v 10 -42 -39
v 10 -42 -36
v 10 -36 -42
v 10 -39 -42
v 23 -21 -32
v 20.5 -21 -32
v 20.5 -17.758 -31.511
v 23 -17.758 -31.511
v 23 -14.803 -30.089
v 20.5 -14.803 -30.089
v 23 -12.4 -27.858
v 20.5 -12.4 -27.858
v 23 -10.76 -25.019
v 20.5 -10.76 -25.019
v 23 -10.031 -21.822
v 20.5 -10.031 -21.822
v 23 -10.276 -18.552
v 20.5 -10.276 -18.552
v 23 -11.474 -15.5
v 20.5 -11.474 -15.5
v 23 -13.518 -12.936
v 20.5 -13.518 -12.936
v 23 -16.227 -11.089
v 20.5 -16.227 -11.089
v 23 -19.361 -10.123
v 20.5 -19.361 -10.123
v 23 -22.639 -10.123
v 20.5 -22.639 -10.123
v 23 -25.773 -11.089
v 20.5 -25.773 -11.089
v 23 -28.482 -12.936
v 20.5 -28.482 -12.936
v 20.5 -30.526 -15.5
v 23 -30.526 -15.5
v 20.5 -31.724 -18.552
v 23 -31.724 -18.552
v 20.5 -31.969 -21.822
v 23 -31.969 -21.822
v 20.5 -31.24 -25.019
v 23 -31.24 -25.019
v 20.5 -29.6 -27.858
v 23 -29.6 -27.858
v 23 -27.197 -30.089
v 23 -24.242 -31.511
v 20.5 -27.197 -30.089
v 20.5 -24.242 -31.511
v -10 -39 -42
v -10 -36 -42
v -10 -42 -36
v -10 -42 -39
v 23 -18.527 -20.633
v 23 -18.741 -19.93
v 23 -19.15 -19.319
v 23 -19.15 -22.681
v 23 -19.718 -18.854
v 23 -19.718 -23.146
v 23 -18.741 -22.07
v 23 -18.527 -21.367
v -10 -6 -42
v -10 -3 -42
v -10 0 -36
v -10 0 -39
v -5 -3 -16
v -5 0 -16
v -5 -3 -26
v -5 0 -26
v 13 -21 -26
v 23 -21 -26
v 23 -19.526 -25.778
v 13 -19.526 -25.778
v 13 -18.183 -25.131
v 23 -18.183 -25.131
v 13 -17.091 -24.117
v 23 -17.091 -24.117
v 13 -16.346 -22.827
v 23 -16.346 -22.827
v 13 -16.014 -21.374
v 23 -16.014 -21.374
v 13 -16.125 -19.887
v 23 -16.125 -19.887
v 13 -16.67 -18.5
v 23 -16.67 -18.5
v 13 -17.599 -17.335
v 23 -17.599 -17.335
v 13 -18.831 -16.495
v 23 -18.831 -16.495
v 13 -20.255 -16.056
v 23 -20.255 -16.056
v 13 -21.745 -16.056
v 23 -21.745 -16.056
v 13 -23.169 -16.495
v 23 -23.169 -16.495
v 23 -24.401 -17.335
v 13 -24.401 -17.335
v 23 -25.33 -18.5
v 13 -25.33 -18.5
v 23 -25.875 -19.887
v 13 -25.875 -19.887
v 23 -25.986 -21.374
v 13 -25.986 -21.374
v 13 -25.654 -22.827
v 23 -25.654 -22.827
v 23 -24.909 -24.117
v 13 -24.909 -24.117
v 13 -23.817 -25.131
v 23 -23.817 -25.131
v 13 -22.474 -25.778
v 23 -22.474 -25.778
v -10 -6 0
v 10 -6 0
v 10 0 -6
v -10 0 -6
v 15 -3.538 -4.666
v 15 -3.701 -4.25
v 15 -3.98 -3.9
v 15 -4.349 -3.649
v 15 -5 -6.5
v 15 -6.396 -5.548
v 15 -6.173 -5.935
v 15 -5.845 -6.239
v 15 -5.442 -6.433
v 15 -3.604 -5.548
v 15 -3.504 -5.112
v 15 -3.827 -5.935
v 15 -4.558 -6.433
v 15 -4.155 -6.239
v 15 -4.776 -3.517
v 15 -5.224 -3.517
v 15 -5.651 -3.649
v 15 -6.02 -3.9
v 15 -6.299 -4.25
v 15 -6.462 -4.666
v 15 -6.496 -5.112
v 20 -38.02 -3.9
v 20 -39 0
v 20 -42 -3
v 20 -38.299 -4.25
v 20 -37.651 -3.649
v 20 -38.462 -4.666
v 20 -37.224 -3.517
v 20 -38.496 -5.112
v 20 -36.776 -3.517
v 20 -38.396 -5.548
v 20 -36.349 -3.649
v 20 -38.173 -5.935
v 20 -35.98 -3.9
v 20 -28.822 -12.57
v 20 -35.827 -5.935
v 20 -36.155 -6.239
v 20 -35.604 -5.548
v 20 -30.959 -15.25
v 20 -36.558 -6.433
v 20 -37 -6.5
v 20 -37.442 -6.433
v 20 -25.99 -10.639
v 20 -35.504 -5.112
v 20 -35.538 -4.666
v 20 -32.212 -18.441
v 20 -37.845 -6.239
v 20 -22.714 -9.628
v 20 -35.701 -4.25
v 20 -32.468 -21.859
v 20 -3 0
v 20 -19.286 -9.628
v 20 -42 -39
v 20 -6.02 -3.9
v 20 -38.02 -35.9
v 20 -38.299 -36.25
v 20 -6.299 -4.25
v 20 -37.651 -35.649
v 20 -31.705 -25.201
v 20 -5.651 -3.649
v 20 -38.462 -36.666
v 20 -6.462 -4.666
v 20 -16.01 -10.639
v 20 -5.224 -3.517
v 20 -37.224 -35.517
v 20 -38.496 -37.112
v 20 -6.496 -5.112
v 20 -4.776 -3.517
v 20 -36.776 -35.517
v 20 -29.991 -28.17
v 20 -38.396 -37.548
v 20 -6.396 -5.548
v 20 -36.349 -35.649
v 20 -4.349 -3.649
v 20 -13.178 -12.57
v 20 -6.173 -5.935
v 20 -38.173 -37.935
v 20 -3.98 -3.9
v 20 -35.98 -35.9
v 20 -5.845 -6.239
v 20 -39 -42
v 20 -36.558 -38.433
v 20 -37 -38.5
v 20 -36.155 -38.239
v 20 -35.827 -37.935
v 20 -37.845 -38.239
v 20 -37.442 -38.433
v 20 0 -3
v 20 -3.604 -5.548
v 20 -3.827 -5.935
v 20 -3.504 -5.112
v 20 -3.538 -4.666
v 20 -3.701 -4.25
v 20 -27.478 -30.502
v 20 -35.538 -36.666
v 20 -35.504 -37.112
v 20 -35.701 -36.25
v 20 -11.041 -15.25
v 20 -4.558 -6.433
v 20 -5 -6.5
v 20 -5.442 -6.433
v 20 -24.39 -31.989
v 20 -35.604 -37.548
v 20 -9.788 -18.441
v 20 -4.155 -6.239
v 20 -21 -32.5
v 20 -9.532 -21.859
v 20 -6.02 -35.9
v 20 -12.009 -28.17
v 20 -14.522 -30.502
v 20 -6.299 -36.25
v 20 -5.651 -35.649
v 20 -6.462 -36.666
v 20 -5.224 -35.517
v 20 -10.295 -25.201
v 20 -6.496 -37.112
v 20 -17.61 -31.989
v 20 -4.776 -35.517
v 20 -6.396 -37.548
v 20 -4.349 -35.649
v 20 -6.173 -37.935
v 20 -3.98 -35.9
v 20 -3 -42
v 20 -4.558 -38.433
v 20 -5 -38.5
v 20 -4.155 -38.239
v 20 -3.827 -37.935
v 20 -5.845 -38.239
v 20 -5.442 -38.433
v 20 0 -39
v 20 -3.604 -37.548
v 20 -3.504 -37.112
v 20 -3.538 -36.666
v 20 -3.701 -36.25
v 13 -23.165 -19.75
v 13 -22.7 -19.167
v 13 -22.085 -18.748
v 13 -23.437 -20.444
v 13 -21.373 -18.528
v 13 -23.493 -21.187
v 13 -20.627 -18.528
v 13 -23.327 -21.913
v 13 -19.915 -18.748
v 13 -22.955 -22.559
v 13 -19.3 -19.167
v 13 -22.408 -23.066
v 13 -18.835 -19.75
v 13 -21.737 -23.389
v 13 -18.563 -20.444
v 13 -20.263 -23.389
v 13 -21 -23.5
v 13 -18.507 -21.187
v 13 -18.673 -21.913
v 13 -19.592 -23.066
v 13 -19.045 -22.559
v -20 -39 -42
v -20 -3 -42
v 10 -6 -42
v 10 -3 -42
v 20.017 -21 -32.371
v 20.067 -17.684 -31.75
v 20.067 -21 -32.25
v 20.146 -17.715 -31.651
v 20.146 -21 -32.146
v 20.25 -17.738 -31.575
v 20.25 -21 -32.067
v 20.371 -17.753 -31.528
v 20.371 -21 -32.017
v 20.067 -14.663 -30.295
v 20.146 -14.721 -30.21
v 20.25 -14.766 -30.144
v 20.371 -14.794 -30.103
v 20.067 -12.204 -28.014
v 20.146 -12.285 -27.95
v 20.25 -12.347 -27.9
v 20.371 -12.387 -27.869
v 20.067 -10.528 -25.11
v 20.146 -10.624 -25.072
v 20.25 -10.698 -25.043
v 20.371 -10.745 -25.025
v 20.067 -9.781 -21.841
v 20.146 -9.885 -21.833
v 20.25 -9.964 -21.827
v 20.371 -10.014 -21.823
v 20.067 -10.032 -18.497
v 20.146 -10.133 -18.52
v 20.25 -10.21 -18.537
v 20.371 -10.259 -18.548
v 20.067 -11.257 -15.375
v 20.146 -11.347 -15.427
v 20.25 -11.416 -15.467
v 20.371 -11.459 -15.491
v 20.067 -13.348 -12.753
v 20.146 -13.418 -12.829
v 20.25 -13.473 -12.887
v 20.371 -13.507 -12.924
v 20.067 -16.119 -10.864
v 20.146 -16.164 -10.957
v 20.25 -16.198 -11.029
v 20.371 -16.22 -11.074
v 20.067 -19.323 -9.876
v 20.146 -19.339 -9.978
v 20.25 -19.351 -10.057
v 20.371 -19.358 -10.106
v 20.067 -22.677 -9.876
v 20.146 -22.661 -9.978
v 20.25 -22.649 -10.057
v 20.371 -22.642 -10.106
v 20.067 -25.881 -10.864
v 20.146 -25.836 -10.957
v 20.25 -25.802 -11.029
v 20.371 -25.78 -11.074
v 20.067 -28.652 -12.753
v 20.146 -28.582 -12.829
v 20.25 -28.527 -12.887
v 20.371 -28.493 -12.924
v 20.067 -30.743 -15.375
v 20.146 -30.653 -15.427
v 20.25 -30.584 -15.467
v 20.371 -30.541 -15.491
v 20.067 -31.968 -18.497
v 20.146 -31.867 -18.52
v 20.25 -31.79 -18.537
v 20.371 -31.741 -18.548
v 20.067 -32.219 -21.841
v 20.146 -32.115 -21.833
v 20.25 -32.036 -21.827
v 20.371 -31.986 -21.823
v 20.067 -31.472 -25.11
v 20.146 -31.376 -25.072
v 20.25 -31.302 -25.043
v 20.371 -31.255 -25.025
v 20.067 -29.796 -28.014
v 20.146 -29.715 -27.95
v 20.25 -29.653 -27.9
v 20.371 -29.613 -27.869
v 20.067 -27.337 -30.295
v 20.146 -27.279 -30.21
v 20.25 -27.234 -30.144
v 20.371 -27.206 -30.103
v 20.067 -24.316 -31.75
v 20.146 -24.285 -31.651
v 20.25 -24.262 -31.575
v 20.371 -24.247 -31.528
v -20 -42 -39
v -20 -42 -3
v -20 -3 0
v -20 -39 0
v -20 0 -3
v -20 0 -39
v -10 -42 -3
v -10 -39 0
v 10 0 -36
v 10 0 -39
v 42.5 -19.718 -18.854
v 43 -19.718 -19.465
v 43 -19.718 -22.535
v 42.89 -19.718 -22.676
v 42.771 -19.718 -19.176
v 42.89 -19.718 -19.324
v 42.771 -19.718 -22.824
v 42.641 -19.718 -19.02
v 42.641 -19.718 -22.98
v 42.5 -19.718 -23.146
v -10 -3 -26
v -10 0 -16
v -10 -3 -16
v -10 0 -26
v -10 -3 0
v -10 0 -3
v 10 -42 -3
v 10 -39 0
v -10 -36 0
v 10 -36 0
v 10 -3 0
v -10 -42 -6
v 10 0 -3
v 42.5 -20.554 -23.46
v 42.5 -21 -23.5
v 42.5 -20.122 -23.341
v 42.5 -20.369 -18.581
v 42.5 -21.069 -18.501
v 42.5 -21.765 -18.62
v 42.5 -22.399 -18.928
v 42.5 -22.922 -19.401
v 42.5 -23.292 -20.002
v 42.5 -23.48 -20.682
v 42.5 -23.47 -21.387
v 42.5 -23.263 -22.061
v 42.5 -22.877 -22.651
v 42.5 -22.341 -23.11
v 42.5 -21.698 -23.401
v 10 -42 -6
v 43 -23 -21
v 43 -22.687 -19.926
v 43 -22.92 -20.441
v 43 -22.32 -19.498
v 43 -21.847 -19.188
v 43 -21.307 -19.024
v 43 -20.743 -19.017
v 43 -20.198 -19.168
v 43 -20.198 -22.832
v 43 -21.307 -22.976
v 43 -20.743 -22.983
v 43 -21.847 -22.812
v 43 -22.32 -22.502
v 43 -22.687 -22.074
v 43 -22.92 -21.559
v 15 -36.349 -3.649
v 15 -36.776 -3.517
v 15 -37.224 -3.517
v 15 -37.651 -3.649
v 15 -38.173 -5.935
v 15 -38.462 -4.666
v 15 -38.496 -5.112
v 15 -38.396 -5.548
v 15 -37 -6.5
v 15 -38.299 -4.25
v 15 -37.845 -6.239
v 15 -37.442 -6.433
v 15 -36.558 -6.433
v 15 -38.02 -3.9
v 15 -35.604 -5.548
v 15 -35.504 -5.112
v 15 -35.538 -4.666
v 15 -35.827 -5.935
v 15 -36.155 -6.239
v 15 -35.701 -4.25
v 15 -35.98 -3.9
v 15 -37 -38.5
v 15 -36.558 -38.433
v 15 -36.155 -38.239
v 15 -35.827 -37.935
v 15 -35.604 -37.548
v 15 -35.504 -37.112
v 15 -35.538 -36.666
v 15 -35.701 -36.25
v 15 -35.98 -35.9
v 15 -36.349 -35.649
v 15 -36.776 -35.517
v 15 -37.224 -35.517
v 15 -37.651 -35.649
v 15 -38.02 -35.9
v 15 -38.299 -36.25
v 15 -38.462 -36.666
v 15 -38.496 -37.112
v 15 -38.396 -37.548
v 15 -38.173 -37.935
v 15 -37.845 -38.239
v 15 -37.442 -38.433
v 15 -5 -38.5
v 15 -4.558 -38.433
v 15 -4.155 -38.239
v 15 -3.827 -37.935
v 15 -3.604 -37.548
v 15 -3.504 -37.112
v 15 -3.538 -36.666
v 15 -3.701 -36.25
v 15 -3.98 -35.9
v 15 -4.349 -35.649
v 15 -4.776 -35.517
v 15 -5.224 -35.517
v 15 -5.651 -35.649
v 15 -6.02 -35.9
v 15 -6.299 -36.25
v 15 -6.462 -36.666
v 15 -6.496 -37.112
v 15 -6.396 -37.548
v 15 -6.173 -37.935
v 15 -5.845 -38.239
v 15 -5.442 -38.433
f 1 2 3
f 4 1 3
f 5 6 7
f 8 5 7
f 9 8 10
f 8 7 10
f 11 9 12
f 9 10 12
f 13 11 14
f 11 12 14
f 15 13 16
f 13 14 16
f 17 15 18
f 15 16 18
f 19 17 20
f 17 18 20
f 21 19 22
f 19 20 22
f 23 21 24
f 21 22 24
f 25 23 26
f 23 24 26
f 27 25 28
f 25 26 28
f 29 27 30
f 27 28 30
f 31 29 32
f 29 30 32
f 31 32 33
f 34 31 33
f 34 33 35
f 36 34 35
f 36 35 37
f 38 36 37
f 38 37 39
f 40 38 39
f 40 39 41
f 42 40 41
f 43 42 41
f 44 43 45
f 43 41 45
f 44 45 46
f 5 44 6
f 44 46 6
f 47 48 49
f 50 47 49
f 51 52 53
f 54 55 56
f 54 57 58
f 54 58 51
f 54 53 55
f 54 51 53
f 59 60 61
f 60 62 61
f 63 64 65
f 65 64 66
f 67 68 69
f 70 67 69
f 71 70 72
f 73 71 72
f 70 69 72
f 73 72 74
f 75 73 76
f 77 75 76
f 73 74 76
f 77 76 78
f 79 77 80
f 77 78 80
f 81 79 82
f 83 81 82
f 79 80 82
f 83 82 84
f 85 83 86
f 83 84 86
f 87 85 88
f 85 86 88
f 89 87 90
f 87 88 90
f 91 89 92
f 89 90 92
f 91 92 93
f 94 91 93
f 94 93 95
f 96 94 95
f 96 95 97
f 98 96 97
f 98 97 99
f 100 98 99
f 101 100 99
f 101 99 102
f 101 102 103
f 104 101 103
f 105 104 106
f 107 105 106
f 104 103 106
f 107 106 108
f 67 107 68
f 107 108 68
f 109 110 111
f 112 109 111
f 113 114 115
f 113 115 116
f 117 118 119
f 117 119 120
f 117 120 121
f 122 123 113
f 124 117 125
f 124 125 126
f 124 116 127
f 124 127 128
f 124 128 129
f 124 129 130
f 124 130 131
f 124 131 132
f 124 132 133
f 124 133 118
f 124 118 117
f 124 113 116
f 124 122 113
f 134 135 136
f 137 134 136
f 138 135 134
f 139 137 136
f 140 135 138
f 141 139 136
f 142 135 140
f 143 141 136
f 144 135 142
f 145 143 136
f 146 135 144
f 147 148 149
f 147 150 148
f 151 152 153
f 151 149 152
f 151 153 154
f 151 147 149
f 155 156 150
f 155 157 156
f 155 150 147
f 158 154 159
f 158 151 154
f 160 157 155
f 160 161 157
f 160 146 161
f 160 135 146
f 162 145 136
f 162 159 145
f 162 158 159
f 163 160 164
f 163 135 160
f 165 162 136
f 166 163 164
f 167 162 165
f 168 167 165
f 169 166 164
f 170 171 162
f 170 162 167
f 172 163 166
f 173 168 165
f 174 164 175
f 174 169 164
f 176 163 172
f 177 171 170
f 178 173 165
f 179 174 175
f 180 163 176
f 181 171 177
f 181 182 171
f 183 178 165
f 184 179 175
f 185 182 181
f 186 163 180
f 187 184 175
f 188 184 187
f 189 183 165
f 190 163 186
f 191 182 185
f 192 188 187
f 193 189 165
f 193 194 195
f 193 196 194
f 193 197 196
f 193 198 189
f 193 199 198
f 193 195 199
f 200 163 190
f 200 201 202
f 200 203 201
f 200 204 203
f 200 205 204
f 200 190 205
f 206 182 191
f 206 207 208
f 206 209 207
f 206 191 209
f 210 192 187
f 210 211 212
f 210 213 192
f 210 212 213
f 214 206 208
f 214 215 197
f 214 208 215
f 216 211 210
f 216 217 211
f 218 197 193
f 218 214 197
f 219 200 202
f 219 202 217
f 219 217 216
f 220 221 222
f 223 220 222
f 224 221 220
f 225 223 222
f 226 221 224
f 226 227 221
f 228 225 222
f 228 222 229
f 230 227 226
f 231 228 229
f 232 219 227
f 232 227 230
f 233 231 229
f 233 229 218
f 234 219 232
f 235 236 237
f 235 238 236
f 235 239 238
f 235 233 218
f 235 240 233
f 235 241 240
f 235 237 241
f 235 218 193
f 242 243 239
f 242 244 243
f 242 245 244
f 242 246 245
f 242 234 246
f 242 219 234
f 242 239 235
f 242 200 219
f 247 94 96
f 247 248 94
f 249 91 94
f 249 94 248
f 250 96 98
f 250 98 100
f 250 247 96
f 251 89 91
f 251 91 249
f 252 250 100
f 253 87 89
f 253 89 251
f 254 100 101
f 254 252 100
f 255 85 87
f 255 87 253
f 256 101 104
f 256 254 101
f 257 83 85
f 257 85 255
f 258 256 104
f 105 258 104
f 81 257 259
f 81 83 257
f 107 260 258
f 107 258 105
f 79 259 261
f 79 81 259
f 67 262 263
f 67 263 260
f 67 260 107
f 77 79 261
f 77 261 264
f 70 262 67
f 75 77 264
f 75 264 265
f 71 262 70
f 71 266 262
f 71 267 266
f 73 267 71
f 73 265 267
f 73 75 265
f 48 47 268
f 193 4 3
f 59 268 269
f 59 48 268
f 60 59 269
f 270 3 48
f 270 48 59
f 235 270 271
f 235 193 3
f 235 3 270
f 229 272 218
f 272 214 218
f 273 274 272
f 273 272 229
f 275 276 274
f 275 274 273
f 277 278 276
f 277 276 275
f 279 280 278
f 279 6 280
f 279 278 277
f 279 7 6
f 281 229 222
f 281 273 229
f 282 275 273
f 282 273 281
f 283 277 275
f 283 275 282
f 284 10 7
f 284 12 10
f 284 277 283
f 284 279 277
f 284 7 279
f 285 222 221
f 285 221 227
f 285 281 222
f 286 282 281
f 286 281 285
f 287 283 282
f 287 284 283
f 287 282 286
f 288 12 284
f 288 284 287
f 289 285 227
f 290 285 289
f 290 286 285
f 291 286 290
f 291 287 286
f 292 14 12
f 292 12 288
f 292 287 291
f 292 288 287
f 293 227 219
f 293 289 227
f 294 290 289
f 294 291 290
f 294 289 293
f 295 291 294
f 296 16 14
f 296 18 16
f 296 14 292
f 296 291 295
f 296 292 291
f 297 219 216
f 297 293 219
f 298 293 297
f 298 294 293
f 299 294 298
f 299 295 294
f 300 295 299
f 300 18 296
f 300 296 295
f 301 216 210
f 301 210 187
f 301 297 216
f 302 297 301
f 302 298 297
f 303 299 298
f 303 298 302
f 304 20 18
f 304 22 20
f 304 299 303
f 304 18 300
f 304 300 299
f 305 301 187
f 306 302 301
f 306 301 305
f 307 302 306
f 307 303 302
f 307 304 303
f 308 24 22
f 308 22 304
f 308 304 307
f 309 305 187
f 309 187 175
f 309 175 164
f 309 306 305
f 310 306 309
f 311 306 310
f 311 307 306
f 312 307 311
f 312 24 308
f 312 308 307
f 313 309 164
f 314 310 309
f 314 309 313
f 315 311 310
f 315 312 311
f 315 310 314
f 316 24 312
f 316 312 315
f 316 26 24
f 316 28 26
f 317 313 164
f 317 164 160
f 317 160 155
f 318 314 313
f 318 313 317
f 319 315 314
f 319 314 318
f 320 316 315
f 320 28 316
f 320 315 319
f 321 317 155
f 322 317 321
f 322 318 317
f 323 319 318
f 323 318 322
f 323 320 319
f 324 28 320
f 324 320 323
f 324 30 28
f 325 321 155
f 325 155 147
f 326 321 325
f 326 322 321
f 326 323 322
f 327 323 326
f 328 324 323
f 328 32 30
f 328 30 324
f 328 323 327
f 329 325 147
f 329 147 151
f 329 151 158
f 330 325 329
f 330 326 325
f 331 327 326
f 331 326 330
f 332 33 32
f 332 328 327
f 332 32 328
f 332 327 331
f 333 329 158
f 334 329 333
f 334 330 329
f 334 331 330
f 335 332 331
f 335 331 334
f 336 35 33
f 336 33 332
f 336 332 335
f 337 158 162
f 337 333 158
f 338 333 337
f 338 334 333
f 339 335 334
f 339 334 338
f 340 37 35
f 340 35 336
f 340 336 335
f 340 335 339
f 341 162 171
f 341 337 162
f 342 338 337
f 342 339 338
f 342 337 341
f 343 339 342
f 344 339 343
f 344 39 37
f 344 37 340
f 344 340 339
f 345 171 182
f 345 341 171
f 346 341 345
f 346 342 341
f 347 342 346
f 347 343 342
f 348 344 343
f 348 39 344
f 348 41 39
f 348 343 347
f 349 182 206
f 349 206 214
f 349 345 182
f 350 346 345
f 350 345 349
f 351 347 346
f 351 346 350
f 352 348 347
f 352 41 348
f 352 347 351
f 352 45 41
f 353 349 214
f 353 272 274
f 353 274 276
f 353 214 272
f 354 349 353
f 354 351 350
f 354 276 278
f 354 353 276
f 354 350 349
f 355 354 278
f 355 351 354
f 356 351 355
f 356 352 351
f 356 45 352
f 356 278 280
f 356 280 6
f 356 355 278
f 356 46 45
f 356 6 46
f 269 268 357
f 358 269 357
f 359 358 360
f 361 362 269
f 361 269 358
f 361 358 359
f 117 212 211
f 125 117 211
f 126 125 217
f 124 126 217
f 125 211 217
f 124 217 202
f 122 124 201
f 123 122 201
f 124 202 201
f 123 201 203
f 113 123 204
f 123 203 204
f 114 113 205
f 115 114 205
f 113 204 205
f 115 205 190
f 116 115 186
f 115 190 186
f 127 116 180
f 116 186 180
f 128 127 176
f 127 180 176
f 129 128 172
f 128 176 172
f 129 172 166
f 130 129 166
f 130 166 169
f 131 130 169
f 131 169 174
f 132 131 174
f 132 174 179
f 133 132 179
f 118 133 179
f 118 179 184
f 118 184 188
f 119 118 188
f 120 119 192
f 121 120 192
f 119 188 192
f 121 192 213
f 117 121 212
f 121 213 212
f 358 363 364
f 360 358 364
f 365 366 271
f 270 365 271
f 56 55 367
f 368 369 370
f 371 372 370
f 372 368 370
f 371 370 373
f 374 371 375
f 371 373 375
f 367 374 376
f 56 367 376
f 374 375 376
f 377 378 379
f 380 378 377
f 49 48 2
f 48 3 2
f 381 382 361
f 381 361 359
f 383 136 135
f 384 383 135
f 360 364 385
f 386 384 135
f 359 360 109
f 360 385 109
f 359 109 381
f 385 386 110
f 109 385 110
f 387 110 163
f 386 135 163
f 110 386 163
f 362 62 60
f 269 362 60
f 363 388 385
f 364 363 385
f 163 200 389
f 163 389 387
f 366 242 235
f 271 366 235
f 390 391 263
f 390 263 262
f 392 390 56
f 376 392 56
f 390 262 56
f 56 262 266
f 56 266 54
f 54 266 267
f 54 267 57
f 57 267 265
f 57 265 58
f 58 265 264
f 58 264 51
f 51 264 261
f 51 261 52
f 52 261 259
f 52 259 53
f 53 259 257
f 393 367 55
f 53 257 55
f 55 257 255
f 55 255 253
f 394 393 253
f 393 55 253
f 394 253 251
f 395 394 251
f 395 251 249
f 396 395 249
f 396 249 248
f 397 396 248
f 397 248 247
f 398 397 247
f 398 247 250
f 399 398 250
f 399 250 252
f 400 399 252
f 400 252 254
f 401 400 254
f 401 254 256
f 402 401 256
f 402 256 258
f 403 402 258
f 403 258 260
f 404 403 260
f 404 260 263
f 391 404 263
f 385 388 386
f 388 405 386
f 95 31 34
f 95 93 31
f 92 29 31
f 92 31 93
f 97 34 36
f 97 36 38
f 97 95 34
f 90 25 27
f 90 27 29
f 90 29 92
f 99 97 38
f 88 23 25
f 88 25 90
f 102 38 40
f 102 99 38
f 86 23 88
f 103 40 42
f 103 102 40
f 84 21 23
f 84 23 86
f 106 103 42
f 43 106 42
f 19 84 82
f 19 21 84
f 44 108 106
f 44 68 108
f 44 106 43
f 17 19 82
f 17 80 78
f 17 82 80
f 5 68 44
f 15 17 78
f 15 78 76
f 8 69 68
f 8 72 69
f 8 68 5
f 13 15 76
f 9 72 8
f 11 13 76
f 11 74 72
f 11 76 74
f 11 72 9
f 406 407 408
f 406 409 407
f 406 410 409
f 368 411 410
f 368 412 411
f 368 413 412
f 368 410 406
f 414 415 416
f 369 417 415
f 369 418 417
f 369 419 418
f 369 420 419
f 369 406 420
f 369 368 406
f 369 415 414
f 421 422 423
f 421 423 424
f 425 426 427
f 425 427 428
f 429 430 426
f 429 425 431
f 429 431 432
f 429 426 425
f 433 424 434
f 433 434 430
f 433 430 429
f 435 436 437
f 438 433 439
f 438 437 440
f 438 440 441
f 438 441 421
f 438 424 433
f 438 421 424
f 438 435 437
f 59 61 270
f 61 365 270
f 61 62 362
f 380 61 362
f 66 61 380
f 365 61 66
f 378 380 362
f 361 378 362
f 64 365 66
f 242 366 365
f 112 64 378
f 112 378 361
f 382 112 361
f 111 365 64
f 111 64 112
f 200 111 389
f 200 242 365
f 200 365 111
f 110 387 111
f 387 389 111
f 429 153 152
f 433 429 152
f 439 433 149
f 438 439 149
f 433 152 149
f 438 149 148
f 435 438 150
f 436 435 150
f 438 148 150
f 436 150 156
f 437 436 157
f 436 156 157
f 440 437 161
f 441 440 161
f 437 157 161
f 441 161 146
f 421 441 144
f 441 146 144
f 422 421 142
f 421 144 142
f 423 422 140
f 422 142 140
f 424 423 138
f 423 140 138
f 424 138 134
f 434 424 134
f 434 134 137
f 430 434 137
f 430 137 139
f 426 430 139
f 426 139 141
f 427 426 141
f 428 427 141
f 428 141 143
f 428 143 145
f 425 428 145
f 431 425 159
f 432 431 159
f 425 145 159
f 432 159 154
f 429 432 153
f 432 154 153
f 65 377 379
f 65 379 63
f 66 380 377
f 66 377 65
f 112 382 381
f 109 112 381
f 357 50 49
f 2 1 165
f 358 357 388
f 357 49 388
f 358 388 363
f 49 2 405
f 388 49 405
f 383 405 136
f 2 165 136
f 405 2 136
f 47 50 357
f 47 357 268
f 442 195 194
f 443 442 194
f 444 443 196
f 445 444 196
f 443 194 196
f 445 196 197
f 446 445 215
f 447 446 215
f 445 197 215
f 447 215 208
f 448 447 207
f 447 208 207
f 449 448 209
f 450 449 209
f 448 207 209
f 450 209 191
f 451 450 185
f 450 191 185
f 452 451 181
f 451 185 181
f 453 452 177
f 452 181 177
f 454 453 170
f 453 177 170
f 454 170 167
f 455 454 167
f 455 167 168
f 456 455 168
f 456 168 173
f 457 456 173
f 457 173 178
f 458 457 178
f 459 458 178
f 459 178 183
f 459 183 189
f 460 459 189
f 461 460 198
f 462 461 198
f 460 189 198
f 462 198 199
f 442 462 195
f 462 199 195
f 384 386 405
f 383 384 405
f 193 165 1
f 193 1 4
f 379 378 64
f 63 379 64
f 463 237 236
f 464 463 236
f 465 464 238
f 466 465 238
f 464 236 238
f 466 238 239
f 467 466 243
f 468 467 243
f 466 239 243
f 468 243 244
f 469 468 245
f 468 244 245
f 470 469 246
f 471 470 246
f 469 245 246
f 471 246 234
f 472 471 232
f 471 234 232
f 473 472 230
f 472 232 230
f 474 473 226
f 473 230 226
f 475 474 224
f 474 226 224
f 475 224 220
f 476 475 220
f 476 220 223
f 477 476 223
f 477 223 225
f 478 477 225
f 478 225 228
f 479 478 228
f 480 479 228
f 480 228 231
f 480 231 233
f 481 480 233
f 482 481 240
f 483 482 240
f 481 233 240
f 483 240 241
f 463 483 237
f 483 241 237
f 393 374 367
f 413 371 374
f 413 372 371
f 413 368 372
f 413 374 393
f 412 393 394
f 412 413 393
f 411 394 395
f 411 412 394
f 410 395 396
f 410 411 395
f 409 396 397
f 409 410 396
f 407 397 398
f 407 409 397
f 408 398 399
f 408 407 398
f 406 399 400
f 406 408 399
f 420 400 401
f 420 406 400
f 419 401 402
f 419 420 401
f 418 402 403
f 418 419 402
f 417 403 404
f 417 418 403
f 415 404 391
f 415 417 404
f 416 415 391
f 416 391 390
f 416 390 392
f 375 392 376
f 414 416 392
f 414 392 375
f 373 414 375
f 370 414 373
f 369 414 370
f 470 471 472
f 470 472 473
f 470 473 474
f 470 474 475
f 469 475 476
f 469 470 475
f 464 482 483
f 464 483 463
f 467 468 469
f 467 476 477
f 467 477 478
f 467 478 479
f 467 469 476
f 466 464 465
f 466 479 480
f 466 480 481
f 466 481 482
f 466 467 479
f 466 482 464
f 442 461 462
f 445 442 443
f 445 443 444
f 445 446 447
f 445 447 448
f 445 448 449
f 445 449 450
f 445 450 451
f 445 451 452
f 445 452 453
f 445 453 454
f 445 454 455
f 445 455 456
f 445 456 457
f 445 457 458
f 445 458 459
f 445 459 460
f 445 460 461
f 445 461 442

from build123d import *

# Parameters (mm, degrees)
BOSS_EXTRU_1_DEPTH      = 10
ESQUISSE2_W             = 42
ESQUISSE2_H             = 42
BOSS_EXTRU_2_DEPTH      = 10
ESQUISSE3_W             = 42
ESQUISSE3_H             = 42
BOSS_EXTRU_3_DEPTH      = 10
ESQUISSE4_R             = 11
BOSS_EXTRU_4_DEPTH      = 3
CONG_1_R                = 0.5
ESQUISSE5_R             = 5
ENL_V_MAT_EXTRU_1_DEPTH = 10
ESQUISSE6_R             = 2.5
BOSS_EXTRU_5_DEPTH      = 30
ENL_V_MAT_EXTRU_2_DEPTH = 20
CHANFREIN1_SIZE         = 0.5
ESQUISSE8_R             = 1.5
ENL_V_MAT_EXTRU_3_DEPTH = 5
ENL_V_MAT_EXTRU_5_DEPTH = 41
ESQUISSE11_W            = 5
ESQUISSE11_H            = 10
ENL_V_MAT_EXTRU_6_DEPTH = 3


with BuildPart() as part:
    # Esquisse1 → Boss.-Extru.1 (new body, symmetric)
    with BuildSketch(Plane(origin=(0, 0, 0), x_dir=(0, 0, -1), z_dir=(1, 0, 0))):
        Polygon((6, 0), (36, 0), (42, -6), (42, -36), (36, -42), (6, -42), (0, -36), (0, -6), align=None)
    extrude(amount=BOSS_EXTRU_1_DEPTH, both=True)

    # Esquisse2 → Boss.-Extru.2 (add)
    with BuildSketch(Plane(origin=(10, 0, 0), x_dir=(0, 0, -1), z_dir=(1, 0, 0))):
        with Locations((21, -21)):
            Rectangle(ESQUISSE2_W, ESQUISSE2_H)
    extrude(amount=BOSS_EXTRU_2_DEPTH)

    # Esquisse3 → Boss.-Extru.3 (add)
    with BuildSketch(Plane.ZY.offset(10)):
        with Locations((-21, -21)):
            Rectangle(ESQUISSE3_W, ESQUISSE3_H)
    extrude(amount=BOSS_EXTRU_3_DEPTH)

    # Esquisse4 → Boss.-Extru.4 (add)
    with BuildSketch(Plane(origin=(20, 0, 0), x_dir=(0, 0, -1), z_dir=(1, 0, 0))):
        with Locations((21, -21)):
            Circle(ESQUISSE4_R)
    extrude(amount=BOSS_EXTRU_4_DEPTH)

    # Congé1
    cong_1_edges = [part.edges().sort_by_distance(p)[0] for p in [
        (20, -21, -10),
    ]]
    fillet(cong_1_edges, radius=CONG_1_R)

    # Esquisse5 → Enlèv. mat.-Extru.1 (cut)
    with BuildSketch(Plane(origin=(23, 0, 0), x_dir=(0, 0, -1), z_dir=(1, 0, 0))):
        with Locations((21, -21)):
            Circle(ESQUISSE5_R)
    extrude(amount=-ENL_V_MAT_EXTRU_1_DEPTH, mode=Mode.SUBTRACT)

    # Esquisse6 → Boss.-Extru.5 (add)
    with BuildSketch(Plane(origin=(13, 0, 0), x_dir=(0, 0, -1), z_dir=(1, 0, 0))):
        with Locations((21, -21)):
            Circle(ESQUISSE6_R)
    extrude(amount=BOSS_EXTRU_5_DEPTH)

    # Esquisse7 → Enlèv. mat.-Extru.2 (cut)
    with BuildSketch(Plane(origin=(43, 0, 0), x_dir=(0, 0, -1), z_dir=(1, 0, 0))):
        with BuildLine():
            Line((18.853641827, -19.718147202), (23.146358173, -19.718147202))
            ThreePointArc((23.146358173, -19.718147202), (21, -18.5), (18.853641827, -19.718147202))
        make_face()
    extrude(amount=-ENL_V_MAT_EXTRU_2_DEPTH, mode=Mode.SUBTRACT)

    # Chanfrein1
    chanfrein1_edges = [part.edges().sort_by_distance(p)[0] for p in [
        (43, -23.409968406, -20.335129874),
    ]]
    chamfer(chanfrein1_edges, length=CHANFREIN1_SIZE)

    # Esquisse8 → Enlèv. mat.-Extru.3 (cut)
    with BuildSketch(Plane(origin=(20, 0, 0), x_dir=(0, 0, -1), z_dir=(1, 0, 0))):
        with Locations((5, -5)):
            Circle(ESQUISSE8_R)
        with Locations((37, -5)):
            Circle(ESQUISSE8_R)
        with Locations((5, -37)):
            Circle(ESQUISSE8_R)
        with Locations((37, -37)):
            Circle(ESQUISSE8_R)
    extrude(amount=-ENL_V_MAT_EXTRU_3_DEPTH, mode=Mode.SUBTRACT)

    # Esquisse9 → Enlèv. mat.-Extru.5 (cut, through all)
    with BuildSketch(Plane(origin=(20, 0, 0), x_dir=(0, 0, -1), z_dir=(1, 0, 0))):
        Polygon((3, 0), (0, -3), (0, 0), align=None)
        Polygon((39, 0), (42, -3), (42, 0), align=None)
        Polygon((3, -42), (0, -39), (0, -42), align=None)
        Polygon((39, -42), (42, -39), (42, -42), align=None)
    extrude(amount=-ENL_V_MAT_EXTRU_5_DEPTH, mode=Mode.SUBTRACT)

    # Esquisse11 → Enlèv. mat.-Extru.6 (cut)
    with BuildSketch(Plane(origin=(0, 0, 0), x_dir=(1, 0, 0), z_dir=(0, 1, 0))):
        with Locations((-7.5, 21)):
            Rectangle(ESQUISSE11_W, ESQUISSE11_H)
    extrude(amount=-ENL_V_MAT_EXTRU_6_DEPTH, mode=Mode.SUBTRACT)


solid = part.part
